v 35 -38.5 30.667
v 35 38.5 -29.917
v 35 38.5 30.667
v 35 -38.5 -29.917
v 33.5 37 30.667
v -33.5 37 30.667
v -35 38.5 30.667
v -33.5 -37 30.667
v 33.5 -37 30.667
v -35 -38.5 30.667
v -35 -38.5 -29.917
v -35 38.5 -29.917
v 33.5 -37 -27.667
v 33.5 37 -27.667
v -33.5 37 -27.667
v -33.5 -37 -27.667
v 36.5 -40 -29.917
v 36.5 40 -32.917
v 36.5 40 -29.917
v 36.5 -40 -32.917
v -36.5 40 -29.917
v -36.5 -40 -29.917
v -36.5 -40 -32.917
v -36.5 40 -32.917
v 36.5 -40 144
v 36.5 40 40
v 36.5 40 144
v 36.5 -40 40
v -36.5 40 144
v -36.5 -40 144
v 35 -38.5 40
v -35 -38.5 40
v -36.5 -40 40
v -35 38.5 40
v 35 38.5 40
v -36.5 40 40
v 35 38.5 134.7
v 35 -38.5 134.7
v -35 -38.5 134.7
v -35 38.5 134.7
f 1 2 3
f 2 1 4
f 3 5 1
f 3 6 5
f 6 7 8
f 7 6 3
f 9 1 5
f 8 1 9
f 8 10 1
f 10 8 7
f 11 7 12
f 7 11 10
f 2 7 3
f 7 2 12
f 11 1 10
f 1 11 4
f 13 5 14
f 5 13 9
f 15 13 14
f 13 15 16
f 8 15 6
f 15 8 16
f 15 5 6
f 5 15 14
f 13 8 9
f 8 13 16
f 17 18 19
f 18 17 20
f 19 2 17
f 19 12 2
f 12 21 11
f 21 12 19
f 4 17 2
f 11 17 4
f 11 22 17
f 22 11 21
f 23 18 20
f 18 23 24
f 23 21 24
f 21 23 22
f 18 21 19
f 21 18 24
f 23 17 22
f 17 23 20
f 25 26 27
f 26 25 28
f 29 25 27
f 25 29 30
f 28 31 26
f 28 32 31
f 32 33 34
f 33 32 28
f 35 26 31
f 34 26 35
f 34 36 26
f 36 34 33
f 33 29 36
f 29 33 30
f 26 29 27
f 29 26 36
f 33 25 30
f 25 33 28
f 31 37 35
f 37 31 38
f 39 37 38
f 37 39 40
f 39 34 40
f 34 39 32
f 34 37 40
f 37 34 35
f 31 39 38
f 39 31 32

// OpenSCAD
/*
Width: 67mm
Height: 92
*/

thickness = 3;

width = 67;
depth = 74;
height = 92;


module bottom(){
    union(){
difference(){
    cube([width + thickness, depth + thickness, height * 2 / 3], center= true);
    translate([0, 0, thickness]){
    cube([width, depth, height * 2 / 3], center= true);
    }
}
translate([0, 0, -((height * 2 / 3) / 2) - thickness / 4]){
cube([width + thickness * 2, depth + thickness * 2, thickness], center = true);
}
}
}

module top(){
    translate([0, 0, height]){
    difference(){
            cube([width + thickness * 2, depth + thickness * 2, height + thickness * 4], center= true);
            translate([0,0,-thickness * 1.6]){
            cube([width + thickness, depth + thickness, height + thickness], center= true);
            }
    }
}
}

bottom();
top();
